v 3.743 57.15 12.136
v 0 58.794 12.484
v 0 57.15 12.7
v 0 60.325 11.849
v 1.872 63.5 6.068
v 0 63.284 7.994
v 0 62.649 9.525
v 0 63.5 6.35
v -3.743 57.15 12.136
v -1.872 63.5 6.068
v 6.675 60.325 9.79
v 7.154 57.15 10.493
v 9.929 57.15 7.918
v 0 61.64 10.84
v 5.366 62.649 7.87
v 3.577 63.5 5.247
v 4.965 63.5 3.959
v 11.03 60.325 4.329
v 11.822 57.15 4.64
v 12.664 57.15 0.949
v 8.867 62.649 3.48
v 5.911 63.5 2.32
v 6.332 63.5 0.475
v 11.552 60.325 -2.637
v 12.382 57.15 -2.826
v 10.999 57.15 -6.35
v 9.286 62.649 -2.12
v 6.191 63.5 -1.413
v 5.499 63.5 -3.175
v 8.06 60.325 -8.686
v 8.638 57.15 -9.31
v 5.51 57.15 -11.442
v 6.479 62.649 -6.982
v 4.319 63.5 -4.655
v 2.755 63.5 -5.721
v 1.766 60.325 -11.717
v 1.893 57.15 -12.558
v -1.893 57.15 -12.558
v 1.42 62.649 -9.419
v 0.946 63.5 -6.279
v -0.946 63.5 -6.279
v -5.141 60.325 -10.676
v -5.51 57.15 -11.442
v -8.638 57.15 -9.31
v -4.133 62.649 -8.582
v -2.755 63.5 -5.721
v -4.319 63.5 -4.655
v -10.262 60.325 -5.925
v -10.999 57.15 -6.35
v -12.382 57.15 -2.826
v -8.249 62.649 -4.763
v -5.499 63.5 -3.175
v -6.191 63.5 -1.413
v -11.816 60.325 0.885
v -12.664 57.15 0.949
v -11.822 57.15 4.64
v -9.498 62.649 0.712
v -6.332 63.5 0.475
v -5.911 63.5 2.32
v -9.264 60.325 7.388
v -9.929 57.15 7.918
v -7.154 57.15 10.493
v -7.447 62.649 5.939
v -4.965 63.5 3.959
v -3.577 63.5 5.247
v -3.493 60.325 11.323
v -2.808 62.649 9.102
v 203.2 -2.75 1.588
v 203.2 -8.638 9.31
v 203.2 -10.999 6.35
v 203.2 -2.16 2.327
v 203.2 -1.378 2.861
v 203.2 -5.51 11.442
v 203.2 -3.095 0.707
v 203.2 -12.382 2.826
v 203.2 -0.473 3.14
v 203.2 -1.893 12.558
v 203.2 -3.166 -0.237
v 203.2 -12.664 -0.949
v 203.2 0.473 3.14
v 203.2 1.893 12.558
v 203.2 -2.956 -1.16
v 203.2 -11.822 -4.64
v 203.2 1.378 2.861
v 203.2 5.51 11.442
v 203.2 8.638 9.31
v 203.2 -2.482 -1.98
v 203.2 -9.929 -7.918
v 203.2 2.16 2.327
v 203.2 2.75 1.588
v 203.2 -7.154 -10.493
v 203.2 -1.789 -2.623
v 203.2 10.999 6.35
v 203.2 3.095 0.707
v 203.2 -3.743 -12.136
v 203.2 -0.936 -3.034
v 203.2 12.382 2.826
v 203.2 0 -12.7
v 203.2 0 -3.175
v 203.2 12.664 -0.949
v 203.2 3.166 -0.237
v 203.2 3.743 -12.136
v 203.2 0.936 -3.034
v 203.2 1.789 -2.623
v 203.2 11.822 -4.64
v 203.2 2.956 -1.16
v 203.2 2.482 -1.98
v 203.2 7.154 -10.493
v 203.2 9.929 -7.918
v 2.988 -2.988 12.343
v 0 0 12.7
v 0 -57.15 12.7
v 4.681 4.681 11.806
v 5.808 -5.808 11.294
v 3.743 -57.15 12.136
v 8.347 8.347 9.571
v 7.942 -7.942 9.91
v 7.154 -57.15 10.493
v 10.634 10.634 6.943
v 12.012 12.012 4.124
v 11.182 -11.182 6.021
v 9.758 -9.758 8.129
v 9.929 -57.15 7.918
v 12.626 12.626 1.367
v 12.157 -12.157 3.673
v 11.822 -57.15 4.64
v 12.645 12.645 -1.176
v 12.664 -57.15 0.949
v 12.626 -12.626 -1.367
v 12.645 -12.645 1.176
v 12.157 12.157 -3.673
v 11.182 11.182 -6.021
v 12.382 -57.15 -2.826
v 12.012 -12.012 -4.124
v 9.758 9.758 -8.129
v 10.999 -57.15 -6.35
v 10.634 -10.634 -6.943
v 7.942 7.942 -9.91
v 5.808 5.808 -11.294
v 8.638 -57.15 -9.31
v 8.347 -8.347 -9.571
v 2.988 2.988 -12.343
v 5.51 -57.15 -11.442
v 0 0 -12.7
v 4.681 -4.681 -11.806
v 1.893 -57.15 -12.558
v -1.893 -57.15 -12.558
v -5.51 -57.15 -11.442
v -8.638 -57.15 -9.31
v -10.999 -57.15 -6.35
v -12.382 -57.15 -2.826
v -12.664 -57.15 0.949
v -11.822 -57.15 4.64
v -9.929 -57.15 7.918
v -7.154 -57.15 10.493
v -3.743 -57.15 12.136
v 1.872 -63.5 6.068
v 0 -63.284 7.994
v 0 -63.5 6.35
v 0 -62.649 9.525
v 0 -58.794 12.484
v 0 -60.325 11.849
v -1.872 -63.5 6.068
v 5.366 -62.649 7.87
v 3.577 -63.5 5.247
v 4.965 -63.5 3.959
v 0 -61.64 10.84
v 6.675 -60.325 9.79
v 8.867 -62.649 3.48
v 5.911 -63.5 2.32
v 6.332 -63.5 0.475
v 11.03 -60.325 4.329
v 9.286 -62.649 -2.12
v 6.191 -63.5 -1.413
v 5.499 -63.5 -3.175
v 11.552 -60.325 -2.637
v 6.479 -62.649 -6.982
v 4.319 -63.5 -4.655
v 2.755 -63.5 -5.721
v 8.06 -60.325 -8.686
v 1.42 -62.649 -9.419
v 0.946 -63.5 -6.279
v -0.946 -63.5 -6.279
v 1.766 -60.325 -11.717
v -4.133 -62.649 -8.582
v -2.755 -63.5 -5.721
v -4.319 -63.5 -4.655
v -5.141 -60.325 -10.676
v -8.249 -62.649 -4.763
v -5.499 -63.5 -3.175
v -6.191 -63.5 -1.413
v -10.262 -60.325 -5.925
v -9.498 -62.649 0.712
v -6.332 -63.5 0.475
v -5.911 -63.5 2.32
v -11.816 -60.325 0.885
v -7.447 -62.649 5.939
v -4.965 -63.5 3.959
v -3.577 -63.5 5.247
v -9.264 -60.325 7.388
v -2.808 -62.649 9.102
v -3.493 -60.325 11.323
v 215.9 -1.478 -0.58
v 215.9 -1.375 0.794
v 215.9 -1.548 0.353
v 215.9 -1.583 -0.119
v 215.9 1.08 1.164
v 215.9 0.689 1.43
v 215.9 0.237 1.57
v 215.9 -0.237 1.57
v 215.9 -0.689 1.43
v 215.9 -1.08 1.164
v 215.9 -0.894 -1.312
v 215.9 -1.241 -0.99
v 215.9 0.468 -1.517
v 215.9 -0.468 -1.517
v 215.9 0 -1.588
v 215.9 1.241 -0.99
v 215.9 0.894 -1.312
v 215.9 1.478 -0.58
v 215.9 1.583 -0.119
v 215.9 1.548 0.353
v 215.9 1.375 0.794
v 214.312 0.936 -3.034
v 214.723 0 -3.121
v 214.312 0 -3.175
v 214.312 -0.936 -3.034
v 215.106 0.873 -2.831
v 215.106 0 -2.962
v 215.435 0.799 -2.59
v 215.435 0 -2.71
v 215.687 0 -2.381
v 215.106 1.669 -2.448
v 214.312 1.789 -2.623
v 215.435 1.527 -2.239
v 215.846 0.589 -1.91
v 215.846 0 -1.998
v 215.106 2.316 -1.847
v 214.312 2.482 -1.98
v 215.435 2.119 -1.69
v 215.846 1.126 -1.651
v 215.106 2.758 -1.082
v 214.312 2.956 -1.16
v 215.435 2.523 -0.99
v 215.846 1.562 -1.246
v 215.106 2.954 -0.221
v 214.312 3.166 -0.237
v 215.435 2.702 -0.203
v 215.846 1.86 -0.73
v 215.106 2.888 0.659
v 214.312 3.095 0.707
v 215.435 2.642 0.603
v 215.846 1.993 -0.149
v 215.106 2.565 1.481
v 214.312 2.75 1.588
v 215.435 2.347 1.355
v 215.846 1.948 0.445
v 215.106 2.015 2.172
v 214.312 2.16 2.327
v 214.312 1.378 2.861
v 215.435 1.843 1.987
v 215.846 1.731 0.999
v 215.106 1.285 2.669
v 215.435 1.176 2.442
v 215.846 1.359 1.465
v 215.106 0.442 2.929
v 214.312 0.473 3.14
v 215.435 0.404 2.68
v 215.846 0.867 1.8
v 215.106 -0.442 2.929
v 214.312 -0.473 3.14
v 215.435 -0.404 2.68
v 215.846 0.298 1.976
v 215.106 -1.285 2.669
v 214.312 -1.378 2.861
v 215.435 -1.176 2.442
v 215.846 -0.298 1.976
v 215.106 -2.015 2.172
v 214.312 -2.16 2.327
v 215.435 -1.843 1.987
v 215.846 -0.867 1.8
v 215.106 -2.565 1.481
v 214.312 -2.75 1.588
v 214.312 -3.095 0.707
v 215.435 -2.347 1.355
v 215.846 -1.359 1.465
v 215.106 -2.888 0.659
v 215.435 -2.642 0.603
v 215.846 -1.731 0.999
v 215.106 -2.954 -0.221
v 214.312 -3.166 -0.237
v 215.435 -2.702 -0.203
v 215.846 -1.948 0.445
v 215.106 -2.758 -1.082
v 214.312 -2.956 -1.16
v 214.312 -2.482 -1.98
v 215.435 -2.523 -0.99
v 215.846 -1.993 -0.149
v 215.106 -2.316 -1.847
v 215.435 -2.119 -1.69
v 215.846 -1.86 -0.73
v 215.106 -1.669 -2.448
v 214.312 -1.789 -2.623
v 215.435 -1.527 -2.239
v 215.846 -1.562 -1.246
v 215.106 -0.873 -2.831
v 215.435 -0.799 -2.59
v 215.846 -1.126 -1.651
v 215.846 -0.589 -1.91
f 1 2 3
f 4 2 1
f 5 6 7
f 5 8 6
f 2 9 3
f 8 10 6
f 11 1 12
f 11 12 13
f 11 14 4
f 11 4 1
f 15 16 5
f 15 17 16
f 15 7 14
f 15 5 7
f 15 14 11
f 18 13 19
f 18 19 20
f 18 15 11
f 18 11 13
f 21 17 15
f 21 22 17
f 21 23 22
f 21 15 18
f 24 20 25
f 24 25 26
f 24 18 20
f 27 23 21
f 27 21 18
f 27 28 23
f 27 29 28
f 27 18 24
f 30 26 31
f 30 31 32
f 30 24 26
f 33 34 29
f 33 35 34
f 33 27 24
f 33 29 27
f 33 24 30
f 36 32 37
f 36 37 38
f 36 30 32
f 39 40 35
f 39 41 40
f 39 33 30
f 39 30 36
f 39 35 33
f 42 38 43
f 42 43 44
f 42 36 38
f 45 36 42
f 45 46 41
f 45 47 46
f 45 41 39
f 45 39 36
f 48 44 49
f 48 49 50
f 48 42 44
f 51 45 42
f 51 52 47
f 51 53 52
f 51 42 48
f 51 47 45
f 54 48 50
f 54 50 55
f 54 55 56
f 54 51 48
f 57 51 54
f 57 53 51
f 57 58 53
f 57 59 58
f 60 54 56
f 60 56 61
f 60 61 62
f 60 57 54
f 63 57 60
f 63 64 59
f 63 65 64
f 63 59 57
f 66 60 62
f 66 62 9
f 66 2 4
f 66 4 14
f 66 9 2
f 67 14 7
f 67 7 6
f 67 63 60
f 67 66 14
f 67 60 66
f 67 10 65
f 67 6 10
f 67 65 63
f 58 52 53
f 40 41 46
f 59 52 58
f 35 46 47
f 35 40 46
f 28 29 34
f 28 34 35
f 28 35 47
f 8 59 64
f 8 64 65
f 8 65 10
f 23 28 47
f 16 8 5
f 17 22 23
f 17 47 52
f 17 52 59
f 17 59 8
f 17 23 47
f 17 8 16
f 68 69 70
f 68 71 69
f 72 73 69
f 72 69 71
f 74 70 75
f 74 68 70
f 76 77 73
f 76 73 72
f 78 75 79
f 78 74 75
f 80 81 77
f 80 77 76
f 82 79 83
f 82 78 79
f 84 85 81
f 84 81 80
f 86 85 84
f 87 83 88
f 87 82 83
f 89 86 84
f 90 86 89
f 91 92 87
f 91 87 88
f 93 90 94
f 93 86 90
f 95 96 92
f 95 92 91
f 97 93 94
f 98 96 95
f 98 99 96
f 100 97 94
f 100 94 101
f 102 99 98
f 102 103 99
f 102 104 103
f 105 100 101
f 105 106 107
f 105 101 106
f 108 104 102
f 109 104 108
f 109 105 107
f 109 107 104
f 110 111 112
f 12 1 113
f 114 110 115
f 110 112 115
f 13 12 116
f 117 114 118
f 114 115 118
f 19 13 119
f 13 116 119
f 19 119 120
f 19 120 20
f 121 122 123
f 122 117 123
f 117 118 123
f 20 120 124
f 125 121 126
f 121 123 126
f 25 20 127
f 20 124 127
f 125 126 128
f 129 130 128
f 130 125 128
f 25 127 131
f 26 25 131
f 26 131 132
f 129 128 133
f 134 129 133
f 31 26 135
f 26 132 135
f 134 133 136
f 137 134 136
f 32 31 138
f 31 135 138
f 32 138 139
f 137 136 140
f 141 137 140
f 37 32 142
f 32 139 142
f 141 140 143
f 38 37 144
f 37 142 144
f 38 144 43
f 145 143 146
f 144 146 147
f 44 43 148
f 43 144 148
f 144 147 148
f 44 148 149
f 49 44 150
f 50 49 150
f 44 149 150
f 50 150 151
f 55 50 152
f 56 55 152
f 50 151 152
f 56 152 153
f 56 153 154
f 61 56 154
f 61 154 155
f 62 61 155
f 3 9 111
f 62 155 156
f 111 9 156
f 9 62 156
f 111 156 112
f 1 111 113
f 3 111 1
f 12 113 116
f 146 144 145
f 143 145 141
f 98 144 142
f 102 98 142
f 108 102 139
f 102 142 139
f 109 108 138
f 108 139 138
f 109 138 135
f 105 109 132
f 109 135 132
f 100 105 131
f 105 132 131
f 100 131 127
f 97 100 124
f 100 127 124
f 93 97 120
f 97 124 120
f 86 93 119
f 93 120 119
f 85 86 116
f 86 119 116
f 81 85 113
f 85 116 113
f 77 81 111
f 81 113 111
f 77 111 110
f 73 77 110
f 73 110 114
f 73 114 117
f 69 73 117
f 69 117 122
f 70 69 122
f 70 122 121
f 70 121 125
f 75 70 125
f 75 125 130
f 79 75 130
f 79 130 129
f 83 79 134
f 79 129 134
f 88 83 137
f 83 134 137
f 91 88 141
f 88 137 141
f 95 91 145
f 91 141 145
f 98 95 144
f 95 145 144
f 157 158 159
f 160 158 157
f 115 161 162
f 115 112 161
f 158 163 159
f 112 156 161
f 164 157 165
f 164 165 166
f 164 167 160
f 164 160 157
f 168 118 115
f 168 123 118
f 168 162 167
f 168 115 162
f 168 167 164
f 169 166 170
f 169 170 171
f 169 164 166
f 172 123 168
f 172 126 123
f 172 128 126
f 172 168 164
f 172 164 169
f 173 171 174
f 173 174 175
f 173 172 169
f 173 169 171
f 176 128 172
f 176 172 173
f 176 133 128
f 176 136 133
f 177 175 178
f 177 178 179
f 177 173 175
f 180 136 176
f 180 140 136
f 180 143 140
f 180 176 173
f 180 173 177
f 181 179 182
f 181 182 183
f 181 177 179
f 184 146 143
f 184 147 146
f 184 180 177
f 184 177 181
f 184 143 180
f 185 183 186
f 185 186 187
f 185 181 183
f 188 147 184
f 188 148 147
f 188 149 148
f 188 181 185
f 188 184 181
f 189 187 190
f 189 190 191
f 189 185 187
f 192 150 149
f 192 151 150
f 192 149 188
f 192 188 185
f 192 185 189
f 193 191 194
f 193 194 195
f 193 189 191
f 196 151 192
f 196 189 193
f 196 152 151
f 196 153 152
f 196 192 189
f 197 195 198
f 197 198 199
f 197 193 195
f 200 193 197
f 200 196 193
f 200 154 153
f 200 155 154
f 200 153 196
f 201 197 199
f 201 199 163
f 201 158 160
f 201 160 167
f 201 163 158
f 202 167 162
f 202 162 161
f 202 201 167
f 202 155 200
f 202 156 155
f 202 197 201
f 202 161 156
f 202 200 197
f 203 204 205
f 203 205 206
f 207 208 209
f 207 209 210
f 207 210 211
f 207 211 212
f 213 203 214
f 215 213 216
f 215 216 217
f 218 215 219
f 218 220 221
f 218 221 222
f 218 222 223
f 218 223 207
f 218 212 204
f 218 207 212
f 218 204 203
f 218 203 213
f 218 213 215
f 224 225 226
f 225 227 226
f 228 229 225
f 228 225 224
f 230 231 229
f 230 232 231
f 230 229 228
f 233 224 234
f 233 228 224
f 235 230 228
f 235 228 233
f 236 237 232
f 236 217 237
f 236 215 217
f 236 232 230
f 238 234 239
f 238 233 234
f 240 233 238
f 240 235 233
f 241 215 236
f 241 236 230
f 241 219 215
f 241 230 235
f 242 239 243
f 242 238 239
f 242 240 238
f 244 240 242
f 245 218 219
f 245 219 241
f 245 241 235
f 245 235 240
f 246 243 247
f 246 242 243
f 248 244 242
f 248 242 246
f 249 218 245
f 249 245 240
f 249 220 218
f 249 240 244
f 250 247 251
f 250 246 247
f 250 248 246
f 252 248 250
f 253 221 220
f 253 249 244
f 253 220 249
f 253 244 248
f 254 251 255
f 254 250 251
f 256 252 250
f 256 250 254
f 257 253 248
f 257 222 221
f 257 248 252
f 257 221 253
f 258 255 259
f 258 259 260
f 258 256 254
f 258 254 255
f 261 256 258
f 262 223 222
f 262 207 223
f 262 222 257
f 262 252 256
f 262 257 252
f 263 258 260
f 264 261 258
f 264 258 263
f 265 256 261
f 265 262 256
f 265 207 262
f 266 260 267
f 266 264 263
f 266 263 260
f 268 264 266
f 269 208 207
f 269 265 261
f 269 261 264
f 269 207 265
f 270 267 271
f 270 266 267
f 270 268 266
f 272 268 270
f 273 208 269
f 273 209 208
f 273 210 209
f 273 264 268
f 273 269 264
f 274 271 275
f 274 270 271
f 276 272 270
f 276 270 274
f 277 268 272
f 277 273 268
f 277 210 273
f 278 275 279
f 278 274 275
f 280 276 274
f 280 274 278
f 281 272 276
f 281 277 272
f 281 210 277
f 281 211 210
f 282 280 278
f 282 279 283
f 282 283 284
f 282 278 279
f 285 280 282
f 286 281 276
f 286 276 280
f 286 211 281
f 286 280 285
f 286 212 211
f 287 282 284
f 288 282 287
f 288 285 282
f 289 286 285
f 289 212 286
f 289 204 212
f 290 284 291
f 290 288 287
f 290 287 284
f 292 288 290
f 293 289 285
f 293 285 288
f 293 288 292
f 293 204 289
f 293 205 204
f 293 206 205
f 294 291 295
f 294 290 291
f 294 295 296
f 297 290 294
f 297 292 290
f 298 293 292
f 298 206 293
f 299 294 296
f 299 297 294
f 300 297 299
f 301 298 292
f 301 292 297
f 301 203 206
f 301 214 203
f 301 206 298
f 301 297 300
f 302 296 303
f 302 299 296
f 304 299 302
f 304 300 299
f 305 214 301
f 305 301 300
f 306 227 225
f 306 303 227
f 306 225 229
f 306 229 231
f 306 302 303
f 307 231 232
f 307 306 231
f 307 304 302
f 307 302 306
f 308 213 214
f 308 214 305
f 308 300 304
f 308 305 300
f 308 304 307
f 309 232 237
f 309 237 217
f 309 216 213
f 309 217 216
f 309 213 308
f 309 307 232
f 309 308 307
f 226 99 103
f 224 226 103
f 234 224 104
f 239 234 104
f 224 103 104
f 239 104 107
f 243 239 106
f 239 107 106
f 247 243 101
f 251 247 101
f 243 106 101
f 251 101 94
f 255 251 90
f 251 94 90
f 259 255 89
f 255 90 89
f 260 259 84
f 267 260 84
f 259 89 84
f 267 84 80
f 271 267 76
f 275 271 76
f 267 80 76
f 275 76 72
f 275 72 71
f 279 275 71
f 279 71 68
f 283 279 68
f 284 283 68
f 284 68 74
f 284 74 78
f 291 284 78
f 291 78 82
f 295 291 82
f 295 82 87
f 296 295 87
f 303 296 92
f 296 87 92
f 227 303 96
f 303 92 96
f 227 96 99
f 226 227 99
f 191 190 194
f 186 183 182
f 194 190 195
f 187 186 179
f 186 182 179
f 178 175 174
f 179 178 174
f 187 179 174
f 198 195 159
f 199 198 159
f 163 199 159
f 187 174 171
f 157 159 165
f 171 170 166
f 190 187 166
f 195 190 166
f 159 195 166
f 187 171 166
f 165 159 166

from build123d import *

# Parameters (mm, degrees)
SKETCH1_R                = 12.7
BOSS_EXTRUDE1_DEPTH      = 203.2
SKETCH2_R                = 3.175
BOSS_EXTRUDE2_DEPTH      = 12.7
FILLET2_R                = 1.5875
BOSS_EXTRUDE3_DEPTH      = 63.5
BOSS_EXTRUDE3_DEPTH_BACK = 63.5
SKETCH3_R                = 12.7
FILLET3_R                = 6.35


with BuildPart() as part:
    # Sketch1 → Boss-Extrude1 (new body)
    with BuildSketch(Plane(origin=(0, 0, 0), x_dir=(0, 0, -1), z_dir=(1, 0, 0))):
        Circle(SKETCH1_R)
    extrude(amount=BOSS_EXTRUDE1_DEPTH)

    # Sketch2 → Boss-Extrude2 (add)
    with BuildSketch(Plane(origin=(203.2, 0, 0), x_dir=(0, 0, -1), z_dir=(1, 0, 0))):
        Circle(SKETCH2_R)
    extrude(amount=BOSS_EXTRUDE2_DEPTH)

    # Fillet2
    fillet2_edges = [part.edges().sort_by_distance(p)[0] for p in [
        (215.9, 0, 3.175),
    ]]
    fillet(fillet2_edges, radius=FILLET2_R)

    # Sketch3 → Boss-Extrude3 (add, two sides: drawn at the far end of the back side and taken through both)
    with BuildSketch(Plane(origin=(0, 0, 0), x_dir=(1, 0, 0), z_dir=(0, 1, 0)).offset(-BOSS_EXTRUDE3_DEPTH_BACK)):
        with Locations(Location((0, 0, 0), (0, 0, 270))):
            Circle(SKETCH3_R)
    extrude(amount=BOSS_EXTRUDE3_DEPTH + BOSS_EXTRUDE3_DEPTH_BACK)

    # Fillet3
    # the kernel refuses this fillet: 6.35 mm, written as the material it takes off along each edge
    with BuildSketch(Plane(origin=(0, 63.5, 0), x_dir=(0, 0, 1), z_dir=(-1, 0, 0))) as fillet3_piece_1:
        with BuildLine():
            CenterArc((12.7 - FILLET3_R, -FILLET3_R), FILLET3_R, 0, 90)
            Line((12.7 - FILLET3_R, 0), (12.7, 0))
            Line((12.7, 0), (12.7, -FILLET3_R))
        make_face()
    revolve(axis=Axis((0, 63.5, 0), (0, 1, 0)), mode=Mode.SUBTRACT)
    with BuildSketch(Plane(origin=(0, -63.5, 0), x_dir=(0, 0, 1), z_dir=(-1, 0, 0))) as fillet3_piece_2:
        with BuildLine():
            CenterArc((12.7 - FILLET3_R, FILLET3_R), FILLET3_R, 270, 90)
            Line((12.7 - FILLET3_R, 0), (12.7, 0))
            Line((12.7, 0), (12.7, FILLET3_R))
        make_face()
    revolve(axis=Axis((0, -63.5, 0), (0, 1, 0)), mode=Mode.SUBTRACT)


solid = part.part
